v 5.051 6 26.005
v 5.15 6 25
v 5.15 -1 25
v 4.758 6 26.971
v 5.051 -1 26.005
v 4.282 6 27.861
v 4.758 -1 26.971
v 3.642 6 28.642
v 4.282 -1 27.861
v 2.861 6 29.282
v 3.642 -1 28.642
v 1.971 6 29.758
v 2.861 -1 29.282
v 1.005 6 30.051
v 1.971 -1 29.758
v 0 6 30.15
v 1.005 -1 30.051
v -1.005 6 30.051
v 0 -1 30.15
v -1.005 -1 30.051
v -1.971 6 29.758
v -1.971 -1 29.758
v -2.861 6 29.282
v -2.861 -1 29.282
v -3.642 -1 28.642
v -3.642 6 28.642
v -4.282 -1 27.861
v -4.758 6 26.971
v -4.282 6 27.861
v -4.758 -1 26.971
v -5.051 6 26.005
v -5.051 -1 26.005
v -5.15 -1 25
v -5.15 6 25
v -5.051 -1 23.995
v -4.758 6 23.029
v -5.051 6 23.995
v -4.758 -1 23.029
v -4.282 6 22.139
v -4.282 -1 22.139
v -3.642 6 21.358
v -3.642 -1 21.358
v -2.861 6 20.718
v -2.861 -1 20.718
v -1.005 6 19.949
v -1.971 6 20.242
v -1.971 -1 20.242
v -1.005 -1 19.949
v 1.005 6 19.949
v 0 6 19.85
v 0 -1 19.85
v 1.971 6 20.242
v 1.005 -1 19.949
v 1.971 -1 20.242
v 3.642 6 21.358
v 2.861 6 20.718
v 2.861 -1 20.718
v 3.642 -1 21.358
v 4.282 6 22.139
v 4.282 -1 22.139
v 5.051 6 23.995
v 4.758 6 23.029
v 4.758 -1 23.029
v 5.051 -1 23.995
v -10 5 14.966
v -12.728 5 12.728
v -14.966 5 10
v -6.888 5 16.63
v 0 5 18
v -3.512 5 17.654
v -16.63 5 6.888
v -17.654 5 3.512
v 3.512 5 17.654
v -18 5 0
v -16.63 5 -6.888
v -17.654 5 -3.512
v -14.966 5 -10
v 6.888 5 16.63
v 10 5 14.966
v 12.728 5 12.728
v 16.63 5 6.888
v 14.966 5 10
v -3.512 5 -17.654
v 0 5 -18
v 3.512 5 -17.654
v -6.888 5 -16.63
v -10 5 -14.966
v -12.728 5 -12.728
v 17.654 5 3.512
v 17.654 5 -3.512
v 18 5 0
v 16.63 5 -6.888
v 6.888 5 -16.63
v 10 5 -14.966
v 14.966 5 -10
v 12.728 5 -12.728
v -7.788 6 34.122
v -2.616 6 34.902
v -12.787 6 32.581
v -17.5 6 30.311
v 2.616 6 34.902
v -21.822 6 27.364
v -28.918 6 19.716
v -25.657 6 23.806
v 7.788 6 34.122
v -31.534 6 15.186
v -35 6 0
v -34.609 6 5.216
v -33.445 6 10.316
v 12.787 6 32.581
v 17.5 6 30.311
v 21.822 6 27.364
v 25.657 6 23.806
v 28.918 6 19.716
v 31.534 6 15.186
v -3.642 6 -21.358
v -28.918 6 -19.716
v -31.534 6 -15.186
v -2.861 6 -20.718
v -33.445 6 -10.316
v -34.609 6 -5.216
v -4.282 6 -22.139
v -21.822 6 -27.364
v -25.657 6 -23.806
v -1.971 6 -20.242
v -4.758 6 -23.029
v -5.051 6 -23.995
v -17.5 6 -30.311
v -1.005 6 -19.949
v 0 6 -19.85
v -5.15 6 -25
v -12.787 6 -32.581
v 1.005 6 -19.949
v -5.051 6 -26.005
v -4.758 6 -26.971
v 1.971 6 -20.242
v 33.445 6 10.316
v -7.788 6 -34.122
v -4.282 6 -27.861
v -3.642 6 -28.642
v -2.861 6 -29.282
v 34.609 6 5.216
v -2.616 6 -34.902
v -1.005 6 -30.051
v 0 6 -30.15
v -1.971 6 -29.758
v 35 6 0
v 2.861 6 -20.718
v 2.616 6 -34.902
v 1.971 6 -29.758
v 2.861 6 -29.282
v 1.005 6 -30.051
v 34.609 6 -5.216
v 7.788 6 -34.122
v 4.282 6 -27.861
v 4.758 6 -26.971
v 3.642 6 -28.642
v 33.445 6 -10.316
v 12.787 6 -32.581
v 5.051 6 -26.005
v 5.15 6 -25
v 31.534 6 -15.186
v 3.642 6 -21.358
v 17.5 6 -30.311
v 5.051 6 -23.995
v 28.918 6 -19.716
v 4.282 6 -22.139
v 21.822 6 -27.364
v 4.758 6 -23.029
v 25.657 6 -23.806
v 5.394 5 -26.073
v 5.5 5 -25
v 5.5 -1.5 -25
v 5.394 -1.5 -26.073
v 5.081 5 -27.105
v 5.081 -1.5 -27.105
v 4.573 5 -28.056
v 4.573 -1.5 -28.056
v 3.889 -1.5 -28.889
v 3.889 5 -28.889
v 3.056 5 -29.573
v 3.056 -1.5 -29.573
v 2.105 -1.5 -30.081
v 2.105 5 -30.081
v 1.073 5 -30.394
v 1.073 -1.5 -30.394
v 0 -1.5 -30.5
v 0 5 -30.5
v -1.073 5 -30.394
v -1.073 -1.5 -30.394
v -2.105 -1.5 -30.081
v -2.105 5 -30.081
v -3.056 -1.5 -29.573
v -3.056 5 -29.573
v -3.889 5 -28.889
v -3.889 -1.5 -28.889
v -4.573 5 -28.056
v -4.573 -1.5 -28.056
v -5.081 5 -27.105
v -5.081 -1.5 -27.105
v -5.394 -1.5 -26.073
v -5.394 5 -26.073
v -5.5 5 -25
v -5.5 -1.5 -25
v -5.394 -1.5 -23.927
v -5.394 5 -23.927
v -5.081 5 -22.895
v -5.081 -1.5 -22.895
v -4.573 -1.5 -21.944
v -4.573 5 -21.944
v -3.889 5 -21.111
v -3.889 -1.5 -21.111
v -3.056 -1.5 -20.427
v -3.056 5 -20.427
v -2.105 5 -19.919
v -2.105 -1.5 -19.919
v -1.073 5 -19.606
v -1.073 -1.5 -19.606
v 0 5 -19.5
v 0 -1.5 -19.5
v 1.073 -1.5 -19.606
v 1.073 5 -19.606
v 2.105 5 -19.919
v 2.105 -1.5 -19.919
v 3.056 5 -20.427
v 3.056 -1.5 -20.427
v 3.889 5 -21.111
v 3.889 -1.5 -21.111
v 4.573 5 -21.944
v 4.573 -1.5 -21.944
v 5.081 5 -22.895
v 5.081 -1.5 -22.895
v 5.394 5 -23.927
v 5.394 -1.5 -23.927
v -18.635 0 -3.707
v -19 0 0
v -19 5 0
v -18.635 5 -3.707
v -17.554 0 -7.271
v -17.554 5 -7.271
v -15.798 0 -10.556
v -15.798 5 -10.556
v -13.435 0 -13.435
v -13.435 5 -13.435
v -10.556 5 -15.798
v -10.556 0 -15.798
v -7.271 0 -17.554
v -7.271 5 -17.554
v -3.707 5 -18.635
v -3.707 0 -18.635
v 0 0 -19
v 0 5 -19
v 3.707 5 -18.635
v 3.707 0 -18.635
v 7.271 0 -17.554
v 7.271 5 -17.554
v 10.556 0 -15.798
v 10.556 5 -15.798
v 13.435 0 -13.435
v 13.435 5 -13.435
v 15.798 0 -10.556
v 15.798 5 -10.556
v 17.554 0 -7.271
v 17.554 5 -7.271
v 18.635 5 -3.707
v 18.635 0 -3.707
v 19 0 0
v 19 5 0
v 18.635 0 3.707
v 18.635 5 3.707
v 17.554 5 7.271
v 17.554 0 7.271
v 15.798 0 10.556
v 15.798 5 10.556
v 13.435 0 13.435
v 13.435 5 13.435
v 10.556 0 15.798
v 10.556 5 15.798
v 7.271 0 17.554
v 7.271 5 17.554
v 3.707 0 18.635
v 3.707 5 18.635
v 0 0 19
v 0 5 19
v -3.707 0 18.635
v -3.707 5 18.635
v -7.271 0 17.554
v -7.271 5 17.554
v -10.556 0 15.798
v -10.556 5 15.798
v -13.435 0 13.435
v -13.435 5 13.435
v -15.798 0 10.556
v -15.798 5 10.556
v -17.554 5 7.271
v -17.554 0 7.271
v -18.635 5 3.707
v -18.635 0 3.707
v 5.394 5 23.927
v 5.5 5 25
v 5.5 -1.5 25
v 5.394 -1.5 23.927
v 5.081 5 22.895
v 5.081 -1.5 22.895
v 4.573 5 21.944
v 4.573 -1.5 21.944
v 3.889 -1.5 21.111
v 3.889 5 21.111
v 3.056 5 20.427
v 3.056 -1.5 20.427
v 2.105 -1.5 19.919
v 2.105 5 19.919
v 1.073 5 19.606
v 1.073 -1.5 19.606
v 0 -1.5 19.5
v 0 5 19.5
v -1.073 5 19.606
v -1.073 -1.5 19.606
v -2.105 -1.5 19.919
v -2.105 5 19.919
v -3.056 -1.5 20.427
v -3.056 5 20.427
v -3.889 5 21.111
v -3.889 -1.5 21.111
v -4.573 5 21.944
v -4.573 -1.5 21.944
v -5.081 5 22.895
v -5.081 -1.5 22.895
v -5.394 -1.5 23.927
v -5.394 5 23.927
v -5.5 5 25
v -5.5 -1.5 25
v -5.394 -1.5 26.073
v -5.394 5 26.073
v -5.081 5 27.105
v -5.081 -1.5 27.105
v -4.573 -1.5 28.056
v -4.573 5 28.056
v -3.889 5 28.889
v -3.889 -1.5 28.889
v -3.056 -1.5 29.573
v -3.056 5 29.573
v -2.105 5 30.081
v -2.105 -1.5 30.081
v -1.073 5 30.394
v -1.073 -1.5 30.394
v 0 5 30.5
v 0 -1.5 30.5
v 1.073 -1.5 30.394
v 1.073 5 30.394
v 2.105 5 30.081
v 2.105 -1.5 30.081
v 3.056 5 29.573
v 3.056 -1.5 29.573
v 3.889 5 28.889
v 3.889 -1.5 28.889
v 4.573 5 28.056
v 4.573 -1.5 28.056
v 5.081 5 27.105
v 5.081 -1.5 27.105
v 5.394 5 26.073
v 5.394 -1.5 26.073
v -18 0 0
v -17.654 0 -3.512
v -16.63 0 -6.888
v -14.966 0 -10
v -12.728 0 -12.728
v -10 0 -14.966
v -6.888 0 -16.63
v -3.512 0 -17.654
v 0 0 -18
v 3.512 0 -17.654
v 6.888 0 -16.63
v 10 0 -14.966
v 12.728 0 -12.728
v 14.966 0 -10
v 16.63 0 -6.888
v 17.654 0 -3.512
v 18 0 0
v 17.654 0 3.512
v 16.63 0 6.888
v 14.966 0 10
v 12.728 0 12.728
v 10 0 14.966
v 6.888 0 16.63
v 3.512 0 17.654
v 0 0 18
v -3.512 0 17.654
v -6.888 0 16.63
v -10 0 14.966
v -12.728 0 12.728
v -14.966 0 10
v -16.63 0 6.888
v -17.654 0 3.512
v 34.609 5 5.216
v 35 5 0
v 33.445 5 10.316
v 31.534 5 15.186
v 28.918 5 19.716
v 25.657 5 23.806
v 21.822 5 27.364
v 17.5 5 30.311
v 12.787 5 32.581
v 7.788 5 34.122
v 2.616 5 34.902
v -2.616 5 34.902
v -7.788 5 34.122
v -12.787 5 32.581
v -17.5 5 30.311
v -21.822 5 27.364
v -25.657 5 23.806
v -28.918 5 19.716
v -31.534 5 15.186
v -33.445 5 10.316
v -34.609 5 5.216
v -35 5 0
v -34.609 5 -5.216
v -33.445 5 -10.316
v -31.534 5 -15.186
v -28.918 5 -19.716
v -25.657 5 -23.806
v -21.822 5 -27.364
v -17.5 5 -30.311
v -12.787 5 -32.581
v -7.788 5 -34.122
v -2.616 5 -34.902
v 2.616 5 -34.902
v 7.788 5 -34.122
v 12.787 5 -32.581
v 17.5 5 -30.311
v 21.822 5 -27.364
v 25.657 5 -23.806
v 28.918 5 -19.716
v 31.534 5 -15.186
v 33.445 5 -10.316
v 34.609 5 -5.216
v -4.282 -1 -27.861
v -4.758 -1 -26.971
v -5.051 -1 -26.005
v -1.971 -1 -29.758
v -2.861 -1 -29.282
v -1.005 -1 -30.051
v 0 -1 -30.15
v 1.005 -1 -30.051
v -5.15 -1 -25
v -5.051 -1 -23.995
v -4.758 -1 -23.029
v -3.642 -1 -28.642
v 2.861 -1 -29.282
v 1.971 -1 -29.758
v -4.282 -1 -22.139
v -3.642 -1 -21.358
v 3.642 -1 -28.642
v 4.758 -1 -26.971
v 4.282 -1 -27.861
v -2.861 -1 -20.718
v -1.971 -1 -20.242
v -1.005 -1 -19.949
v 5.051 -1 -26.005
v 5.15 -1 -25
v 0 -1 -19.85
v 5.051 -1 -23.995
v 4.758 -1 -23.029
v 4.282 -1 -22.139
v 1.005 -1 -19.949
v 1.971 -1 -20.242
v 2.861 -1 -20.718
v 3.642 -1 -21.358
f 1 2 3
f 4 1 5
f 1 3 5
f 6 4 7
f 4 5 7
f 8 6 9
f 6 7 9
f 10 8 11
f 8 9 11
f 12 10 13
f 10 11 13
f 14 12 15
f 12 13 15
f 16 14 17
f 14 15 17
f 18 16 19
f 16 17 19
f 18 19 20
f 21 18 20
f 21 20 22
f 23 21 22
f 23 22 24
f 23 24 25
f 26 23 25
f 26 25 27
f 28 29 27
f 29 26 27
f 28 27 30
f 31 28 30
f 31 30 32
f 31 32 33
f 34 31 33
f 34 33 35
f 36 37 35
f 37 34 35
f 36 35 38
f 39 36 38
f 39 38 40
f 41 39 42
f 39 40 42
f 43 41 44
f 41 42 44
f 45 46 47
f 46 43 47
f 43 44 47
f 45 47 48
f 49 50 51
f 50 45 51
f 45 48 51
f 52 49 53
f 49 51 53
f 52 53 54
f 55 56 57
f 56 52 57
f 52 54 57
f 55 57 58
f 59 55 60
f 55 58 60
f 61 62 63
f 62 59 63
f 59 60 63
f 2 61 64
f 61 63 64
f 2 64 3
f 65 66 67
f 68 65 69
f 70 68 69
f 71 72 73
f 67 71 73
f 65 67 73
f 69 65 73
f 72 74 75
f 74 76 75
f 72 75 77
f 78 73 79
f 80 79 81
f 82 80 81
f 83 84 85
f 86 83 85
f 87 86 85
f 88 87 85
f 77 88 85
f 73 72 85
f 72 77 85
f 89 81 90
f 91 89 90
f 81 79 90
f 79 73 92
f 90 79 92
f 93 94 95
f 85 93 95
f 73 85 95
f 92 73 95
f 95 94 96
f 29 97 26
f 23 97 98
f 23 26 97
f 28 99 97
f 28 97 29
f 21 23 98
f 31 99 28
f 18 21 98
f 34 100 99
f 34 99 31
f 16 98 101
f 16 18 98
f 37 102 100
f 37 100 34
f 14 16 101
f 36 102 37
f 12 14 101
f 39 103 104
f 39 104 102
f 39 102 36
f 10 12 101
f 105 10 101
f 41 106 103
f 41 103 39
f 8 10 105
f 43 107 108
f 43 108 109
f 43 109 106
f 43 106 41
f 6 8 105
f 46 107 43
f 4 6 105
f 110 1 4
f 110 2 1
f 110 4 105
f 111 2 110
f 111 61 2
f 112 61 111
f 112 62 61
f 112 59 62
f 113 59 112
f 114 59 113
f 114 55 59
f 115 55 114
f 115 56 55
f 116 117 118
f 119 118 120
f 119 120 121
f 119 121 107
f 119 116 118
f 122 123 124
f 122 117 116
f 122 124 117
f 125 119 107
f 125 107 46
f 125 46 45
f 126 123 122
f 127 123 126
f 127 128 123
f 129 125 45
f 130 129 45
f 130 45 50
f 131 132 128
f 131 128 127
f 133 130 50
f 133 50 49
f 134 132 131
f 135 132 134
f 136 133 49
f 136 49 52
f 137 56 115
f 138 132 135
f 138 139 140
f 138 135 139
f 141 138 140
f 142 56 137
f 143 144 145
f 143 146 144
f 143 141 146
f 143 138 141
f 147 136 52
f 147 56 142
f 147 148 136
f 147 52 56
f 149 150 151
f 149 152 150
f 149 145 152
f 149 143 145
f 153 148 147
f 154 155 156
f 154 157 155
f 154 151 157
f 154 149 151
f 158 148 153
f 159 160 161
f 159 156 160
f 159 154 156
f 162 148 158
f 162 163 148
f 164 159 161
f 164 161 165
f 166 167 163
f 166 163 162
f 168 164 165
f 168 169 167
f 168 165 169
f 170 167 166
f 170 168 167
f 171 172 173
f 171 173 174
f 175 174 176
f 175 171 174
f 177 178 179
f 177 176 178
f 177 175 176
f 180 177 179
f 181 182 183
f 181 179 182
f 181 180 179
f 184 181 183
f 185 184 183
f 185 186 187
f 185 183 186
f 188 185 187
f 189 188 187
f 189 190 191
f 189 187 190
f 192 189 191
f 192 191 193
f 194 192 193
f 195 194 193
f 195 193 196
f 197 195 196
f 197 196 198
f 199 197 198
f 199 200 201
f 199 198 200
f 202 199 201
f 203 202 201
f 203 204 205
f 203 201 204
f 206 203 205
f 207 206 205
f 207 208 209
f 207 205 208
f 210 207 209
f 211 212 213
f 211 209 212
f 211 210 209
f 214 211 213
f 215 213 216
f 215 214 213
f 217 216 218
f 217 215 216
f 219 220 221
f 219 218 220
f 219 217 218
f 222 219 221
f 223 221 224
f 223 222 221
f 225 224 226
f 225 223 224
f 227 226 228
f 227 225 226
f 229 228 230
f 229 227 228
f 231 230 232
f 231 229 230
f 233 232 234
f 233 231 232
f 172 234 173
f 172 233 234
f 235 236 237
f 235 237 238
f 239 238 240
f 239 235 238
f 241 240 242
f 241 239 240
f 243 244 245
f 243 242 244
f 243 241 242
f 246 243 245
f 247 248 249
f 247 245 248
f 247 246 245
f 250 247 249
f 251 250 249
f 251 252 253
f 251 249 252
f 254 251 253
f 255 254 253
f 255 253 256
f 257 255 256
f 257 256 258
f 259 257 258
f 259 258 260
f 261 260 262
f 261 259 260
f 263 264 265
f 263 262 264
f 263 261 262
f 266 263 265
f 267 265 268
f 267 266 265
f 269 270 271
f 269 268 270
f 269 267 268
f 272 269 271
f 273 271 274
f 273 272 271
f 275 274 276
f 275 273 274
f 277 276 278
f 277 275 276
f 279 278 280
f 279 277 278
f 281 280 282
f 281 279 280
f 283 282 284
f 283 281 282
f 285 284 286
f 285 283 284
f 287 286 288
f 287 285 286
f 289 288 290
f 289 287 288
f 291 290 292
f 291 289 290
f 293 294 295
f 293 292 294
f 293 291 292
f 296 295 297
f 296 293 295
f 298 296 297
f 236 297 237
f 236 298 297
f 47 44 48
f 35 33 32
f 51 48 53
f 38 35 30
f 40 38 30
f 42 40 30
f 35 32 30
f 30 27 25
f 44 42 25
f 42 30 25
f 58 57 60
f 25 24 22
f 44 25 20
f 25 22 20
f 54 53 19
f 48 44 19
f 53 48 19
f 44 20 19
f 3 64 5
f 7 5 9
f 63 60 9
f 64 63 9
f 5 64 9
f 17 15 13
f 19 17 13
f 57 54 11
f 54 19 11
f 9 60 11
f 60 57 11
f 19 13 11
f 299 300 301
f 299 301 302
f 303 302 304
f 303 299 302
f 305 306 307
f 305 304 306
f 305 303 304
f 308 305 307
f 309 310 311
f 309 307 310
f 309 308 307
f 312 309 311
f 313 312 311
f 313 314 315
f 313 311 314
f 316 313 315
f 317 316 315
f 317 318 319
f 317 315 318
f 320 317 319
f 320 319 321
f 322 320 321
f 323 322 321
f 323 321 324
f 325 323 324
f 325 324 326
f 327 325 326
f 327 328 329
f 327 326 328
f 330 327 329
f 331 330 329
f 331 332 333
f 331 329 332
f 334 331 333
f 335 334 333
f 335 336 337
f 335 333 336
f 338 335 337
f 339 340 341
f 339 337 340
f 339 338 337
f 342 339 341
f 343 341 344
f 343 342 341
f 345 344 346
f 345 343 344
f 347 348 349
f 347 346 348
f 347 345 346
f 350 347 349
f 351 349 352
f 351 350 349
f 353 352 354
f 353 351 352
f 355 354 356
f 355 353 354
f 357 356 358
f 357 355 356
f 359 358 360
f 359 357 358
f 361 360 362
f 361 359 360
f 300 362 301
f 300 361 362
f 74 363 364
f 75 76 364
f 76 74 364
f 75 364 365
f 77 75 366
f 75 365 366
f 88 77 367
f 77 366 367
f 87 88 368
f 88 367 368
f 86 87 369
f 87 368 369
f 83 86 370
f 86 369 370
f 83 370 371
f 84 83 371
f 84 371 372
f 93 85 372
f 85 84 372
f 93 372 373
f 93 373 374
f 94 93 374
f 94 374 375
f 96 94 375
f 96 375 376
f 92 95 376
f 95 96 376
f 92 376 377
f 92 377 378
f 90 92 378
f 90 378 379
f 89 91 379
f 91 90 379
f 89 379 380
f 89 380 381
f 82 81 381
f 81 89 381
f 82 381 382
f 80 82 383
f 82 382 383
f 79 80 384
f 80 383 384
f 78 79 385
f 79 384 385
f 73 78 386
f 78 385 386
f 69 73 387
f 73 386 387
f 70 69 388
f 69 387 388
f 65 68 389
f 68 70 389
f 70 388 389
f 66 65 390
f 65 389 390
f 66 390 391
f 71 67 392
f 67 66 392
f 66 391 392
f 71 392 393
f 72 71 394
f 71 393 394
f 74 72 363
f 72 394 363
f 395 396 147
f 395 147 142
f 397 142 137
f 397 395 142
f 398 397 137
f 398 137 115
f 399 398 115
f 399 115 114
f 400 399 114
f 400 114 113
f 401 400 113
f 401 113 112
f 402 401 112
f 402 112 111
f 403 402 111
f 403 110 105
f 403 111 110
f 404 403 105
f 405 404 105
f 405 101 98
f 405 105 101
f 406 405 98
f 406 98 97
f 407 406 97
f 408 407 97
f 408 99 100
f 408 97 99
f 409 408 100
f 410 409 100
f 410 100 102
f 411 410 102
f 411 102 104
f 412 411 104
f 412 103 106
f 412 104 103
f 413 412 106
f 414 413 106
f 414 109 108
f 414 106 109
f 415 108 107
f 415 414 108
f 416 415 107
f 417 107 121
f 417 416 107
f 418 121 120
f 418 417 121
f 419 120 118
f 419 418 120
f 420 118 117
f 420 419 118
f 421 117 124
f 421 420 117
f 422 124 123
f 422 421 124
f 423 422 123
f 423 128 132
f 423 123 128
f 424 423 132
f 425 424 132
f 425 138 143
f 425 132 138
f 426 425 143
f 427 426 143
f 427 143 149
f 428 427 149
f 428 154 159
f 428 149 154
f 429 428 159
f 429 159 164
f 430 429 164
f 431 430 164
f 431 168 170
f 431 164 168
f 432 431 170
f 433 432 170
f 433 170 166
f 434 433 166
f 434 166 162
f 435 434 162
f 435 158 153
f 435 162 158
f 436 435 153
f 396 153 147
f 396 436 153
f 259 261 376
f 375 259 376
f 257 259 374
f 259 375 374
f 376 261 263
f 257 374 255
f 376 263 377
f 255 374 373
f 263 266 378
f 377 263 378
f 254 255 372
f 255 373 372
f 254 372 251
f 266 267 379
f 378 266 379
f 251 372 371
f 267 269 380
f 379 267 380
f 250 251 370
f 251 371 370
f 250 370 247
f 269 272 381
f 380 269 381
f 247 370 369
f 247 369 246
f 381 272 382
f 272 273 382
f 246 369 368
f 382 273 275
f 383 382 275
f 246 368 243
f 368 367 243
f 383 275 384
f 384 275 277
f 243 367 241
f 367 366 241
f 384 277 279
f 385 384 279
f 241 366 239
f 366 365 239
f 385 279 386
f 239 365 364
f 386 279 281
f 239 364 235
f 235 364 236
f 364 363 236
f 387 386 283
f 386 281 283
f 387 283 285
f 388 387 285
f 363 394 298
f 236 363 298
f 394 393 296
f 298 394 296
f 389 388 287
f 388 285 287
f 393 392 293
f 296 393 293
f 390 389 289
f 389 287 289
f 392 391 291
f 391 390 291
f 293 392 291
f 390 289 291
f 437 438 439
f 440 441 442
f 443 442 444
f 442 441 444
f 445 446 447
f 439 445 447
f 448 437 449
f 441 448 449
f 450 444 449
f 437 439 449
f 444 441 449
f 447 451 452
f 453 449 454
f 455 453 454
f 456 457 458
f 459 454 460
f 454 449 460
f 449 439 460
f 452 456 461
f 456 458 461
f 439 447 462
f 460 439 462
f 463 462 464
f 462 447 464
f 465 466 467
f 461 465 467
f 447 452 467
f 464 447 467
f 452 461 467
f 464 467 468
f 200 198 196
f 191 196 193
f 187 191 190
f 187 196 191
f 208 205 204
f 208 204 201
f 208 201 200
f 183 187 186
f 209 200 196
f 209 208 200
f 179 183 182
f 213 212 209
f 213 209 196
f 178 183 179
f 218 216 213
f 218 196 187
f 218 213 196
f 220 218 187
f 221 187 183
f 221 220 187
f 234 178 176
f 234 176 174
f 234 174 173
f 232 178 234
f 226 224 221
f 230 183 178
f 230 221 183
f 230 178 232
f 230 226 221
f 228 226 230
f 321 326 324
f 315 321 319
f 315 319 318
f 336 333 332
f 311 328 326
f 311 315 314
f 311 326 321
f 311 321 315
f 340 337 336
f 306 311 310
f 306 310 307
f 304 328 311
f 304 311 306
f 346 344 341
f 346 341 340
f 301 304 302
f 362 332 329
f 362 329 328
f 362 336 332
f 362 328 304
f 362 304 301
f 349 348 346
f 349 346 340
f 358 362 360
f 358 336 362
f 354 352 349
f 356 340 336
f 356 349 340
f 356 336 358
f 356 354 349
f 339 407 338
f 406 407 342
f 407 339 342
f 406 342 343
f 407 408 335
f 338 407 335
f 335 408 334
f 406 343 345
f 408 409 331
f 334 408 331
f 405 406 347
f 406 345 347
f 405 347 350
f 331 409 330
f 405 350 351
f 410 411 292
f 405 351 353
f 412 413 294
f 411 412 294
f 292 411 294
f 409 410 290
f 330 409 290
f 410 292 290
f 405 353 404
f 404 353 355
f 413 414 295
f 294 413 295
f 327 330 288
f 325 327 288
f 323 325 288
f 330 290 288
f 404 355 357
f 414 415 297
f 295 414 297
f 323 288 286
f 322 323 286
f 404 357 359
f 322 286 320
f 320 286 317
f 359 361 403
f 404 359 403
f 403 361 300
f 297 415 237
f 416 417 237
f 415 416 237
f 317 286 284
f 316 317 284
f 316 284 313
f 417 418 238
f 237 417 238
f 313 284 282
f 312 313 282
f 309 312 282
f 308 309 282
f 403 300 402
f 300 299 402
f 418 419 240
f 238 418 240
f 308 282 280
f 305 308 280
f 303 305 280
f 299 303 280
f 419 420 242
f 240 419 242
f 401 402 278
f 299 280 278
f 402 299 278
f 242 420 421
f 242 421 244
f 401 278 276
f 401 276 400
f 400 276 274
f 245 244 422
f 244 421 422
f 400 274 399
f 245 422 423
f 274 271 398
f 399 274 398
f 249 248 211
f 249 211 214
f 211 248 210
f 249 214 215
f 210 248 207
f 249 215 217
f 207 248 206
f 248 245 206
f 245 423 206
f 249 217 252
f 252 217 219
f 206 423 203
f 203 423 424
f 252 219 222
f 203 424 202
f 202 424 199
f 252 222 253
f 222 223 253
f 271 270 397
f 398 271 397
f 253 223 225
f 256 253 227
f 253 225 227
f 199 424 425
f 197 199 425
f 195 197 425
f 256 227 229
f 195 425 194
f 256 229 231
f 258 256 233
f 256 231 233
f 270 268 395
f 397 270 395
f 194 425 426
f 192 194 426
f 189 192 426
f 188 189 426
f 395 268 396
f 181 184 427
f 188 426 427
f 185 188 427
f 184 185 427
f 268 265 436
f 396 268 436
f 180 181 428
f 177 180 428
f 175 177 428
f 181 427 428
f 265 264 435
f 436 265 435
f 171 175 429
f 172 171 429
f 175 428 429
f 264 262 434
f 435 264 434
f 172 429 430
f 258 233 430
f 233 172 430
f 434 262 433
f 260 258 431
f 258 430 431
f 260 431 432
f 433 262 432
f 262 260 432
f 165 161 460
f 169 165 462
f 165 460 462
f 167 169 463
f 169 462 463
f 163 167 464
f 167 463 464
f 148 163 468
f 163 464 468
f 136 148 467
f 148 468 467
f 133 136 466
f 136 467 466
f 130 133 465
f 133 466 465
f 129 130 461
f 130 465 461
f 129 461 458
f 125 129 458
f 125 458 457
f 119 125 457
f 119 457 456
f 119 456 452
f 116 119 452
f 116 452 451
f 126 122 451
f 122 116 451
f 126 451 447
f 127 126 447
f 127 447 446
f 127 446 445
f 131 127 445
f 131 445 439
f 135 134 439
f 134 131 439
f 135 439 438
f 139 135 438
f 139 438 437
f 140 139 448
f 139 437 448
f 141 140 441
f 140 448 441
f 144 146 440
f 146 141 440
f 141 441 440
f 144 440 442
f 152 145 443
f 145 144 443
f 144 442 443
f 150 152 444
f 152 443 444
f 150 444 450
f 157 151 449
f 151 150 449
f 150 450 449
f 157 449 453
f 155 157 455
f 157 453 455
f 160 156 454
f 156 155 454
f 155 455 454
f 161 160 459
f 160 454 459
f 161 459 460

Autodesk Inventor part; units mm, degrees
ref_plane "YZ Plane" through (0, 0, 0) normal (1, 0, 0) x (0, 1, 0)
ref_plane "XZ Plane" through (0, 0, 0) normal (0, 1, 0) x (-1, 0, 0)
ref_plane "XY Plane" through (0, 0, 0) normal (0, 0, 1) x (1, 0, 0)
sketch "Sketch1" plane through (0, 0, 0) normal (0, 1, 0) x (-1, 0, 0)
  circle A0 centre (0, 0) radius 18
  circle A1 centre (0, 0) radius 19
  dimension "d0" = 36
  dimension "d1" = 38
extrude "Extrusion1" add sketch "Sketch1" along normal blind 5
sketch "Sketch2" plane through (0, 5, 0) normal (0, 1, 0) x (1, 0, 0)
  circle A0 centre (0, 0) radius 35
  circle A1 centre (0, 0) radius 19 projected
  circle A2 centre (0, -25) radius 5.15
  circle A3 centre (0, 25) radius 5.15
  dimension "d4" = 16
  dimension "d5" = 10.3
  dimension "d6" = 10.3
  dimension "d7" = 25
  dimension "d8" = 25
extrude "Extrusion2" add sketch "Sketch2" along normal blind 1 contours A0 | A1
sketch "Sketch3" plane through (0, 5, 0) normal (0, -1, 0) x (1, 0, 0)
  circle A0 centre (0, 25) radius 5.15
  circle A1 centre (0, -25) radius 5.15
  circle A2 centre (0, -25) radius 5.15 projected
  circle A3 centre (0, 25) radius 5.15 projected
  circle A4 centre (0, 25) radius 5.5
  circle A5 centre (0, -25) radius 5.5
  point P0 (0, 0)
  point P1 (-4.4822, -18.4638)
  point P2 (4.4822, -18.4638)
  point P3 (4.4822, 18.4638)
  point P4 (-4.4822, 18.4638)
  dimension "d11" = 10.3
  dimension "d12" = 10.3
  dimension "d13" = 0
  dimension "d14" = 0
  dimension "d15" = 11
  dimension "d16" = 11
extrude "Extrusion3" add sketch "Sketch3" along normal blind 6
sketch "Sketch4" plane through (0, -1, 25) normal (0, -1, 0) x (1, 0, 0)
  circle A0 centre (0, 0) radius 5.5
  circle A1 centre (0, -50) radius 5.5
  circle A2 centre (0, -50) radius 5.5 projected
  point P0 (0, -25)
  dimension "d19" = 11
  dimension "d20" = 0
extrude "Extrusion4" add sketch "Sketch4" along normal blind 0.5
properties part number "magnet_holder"
